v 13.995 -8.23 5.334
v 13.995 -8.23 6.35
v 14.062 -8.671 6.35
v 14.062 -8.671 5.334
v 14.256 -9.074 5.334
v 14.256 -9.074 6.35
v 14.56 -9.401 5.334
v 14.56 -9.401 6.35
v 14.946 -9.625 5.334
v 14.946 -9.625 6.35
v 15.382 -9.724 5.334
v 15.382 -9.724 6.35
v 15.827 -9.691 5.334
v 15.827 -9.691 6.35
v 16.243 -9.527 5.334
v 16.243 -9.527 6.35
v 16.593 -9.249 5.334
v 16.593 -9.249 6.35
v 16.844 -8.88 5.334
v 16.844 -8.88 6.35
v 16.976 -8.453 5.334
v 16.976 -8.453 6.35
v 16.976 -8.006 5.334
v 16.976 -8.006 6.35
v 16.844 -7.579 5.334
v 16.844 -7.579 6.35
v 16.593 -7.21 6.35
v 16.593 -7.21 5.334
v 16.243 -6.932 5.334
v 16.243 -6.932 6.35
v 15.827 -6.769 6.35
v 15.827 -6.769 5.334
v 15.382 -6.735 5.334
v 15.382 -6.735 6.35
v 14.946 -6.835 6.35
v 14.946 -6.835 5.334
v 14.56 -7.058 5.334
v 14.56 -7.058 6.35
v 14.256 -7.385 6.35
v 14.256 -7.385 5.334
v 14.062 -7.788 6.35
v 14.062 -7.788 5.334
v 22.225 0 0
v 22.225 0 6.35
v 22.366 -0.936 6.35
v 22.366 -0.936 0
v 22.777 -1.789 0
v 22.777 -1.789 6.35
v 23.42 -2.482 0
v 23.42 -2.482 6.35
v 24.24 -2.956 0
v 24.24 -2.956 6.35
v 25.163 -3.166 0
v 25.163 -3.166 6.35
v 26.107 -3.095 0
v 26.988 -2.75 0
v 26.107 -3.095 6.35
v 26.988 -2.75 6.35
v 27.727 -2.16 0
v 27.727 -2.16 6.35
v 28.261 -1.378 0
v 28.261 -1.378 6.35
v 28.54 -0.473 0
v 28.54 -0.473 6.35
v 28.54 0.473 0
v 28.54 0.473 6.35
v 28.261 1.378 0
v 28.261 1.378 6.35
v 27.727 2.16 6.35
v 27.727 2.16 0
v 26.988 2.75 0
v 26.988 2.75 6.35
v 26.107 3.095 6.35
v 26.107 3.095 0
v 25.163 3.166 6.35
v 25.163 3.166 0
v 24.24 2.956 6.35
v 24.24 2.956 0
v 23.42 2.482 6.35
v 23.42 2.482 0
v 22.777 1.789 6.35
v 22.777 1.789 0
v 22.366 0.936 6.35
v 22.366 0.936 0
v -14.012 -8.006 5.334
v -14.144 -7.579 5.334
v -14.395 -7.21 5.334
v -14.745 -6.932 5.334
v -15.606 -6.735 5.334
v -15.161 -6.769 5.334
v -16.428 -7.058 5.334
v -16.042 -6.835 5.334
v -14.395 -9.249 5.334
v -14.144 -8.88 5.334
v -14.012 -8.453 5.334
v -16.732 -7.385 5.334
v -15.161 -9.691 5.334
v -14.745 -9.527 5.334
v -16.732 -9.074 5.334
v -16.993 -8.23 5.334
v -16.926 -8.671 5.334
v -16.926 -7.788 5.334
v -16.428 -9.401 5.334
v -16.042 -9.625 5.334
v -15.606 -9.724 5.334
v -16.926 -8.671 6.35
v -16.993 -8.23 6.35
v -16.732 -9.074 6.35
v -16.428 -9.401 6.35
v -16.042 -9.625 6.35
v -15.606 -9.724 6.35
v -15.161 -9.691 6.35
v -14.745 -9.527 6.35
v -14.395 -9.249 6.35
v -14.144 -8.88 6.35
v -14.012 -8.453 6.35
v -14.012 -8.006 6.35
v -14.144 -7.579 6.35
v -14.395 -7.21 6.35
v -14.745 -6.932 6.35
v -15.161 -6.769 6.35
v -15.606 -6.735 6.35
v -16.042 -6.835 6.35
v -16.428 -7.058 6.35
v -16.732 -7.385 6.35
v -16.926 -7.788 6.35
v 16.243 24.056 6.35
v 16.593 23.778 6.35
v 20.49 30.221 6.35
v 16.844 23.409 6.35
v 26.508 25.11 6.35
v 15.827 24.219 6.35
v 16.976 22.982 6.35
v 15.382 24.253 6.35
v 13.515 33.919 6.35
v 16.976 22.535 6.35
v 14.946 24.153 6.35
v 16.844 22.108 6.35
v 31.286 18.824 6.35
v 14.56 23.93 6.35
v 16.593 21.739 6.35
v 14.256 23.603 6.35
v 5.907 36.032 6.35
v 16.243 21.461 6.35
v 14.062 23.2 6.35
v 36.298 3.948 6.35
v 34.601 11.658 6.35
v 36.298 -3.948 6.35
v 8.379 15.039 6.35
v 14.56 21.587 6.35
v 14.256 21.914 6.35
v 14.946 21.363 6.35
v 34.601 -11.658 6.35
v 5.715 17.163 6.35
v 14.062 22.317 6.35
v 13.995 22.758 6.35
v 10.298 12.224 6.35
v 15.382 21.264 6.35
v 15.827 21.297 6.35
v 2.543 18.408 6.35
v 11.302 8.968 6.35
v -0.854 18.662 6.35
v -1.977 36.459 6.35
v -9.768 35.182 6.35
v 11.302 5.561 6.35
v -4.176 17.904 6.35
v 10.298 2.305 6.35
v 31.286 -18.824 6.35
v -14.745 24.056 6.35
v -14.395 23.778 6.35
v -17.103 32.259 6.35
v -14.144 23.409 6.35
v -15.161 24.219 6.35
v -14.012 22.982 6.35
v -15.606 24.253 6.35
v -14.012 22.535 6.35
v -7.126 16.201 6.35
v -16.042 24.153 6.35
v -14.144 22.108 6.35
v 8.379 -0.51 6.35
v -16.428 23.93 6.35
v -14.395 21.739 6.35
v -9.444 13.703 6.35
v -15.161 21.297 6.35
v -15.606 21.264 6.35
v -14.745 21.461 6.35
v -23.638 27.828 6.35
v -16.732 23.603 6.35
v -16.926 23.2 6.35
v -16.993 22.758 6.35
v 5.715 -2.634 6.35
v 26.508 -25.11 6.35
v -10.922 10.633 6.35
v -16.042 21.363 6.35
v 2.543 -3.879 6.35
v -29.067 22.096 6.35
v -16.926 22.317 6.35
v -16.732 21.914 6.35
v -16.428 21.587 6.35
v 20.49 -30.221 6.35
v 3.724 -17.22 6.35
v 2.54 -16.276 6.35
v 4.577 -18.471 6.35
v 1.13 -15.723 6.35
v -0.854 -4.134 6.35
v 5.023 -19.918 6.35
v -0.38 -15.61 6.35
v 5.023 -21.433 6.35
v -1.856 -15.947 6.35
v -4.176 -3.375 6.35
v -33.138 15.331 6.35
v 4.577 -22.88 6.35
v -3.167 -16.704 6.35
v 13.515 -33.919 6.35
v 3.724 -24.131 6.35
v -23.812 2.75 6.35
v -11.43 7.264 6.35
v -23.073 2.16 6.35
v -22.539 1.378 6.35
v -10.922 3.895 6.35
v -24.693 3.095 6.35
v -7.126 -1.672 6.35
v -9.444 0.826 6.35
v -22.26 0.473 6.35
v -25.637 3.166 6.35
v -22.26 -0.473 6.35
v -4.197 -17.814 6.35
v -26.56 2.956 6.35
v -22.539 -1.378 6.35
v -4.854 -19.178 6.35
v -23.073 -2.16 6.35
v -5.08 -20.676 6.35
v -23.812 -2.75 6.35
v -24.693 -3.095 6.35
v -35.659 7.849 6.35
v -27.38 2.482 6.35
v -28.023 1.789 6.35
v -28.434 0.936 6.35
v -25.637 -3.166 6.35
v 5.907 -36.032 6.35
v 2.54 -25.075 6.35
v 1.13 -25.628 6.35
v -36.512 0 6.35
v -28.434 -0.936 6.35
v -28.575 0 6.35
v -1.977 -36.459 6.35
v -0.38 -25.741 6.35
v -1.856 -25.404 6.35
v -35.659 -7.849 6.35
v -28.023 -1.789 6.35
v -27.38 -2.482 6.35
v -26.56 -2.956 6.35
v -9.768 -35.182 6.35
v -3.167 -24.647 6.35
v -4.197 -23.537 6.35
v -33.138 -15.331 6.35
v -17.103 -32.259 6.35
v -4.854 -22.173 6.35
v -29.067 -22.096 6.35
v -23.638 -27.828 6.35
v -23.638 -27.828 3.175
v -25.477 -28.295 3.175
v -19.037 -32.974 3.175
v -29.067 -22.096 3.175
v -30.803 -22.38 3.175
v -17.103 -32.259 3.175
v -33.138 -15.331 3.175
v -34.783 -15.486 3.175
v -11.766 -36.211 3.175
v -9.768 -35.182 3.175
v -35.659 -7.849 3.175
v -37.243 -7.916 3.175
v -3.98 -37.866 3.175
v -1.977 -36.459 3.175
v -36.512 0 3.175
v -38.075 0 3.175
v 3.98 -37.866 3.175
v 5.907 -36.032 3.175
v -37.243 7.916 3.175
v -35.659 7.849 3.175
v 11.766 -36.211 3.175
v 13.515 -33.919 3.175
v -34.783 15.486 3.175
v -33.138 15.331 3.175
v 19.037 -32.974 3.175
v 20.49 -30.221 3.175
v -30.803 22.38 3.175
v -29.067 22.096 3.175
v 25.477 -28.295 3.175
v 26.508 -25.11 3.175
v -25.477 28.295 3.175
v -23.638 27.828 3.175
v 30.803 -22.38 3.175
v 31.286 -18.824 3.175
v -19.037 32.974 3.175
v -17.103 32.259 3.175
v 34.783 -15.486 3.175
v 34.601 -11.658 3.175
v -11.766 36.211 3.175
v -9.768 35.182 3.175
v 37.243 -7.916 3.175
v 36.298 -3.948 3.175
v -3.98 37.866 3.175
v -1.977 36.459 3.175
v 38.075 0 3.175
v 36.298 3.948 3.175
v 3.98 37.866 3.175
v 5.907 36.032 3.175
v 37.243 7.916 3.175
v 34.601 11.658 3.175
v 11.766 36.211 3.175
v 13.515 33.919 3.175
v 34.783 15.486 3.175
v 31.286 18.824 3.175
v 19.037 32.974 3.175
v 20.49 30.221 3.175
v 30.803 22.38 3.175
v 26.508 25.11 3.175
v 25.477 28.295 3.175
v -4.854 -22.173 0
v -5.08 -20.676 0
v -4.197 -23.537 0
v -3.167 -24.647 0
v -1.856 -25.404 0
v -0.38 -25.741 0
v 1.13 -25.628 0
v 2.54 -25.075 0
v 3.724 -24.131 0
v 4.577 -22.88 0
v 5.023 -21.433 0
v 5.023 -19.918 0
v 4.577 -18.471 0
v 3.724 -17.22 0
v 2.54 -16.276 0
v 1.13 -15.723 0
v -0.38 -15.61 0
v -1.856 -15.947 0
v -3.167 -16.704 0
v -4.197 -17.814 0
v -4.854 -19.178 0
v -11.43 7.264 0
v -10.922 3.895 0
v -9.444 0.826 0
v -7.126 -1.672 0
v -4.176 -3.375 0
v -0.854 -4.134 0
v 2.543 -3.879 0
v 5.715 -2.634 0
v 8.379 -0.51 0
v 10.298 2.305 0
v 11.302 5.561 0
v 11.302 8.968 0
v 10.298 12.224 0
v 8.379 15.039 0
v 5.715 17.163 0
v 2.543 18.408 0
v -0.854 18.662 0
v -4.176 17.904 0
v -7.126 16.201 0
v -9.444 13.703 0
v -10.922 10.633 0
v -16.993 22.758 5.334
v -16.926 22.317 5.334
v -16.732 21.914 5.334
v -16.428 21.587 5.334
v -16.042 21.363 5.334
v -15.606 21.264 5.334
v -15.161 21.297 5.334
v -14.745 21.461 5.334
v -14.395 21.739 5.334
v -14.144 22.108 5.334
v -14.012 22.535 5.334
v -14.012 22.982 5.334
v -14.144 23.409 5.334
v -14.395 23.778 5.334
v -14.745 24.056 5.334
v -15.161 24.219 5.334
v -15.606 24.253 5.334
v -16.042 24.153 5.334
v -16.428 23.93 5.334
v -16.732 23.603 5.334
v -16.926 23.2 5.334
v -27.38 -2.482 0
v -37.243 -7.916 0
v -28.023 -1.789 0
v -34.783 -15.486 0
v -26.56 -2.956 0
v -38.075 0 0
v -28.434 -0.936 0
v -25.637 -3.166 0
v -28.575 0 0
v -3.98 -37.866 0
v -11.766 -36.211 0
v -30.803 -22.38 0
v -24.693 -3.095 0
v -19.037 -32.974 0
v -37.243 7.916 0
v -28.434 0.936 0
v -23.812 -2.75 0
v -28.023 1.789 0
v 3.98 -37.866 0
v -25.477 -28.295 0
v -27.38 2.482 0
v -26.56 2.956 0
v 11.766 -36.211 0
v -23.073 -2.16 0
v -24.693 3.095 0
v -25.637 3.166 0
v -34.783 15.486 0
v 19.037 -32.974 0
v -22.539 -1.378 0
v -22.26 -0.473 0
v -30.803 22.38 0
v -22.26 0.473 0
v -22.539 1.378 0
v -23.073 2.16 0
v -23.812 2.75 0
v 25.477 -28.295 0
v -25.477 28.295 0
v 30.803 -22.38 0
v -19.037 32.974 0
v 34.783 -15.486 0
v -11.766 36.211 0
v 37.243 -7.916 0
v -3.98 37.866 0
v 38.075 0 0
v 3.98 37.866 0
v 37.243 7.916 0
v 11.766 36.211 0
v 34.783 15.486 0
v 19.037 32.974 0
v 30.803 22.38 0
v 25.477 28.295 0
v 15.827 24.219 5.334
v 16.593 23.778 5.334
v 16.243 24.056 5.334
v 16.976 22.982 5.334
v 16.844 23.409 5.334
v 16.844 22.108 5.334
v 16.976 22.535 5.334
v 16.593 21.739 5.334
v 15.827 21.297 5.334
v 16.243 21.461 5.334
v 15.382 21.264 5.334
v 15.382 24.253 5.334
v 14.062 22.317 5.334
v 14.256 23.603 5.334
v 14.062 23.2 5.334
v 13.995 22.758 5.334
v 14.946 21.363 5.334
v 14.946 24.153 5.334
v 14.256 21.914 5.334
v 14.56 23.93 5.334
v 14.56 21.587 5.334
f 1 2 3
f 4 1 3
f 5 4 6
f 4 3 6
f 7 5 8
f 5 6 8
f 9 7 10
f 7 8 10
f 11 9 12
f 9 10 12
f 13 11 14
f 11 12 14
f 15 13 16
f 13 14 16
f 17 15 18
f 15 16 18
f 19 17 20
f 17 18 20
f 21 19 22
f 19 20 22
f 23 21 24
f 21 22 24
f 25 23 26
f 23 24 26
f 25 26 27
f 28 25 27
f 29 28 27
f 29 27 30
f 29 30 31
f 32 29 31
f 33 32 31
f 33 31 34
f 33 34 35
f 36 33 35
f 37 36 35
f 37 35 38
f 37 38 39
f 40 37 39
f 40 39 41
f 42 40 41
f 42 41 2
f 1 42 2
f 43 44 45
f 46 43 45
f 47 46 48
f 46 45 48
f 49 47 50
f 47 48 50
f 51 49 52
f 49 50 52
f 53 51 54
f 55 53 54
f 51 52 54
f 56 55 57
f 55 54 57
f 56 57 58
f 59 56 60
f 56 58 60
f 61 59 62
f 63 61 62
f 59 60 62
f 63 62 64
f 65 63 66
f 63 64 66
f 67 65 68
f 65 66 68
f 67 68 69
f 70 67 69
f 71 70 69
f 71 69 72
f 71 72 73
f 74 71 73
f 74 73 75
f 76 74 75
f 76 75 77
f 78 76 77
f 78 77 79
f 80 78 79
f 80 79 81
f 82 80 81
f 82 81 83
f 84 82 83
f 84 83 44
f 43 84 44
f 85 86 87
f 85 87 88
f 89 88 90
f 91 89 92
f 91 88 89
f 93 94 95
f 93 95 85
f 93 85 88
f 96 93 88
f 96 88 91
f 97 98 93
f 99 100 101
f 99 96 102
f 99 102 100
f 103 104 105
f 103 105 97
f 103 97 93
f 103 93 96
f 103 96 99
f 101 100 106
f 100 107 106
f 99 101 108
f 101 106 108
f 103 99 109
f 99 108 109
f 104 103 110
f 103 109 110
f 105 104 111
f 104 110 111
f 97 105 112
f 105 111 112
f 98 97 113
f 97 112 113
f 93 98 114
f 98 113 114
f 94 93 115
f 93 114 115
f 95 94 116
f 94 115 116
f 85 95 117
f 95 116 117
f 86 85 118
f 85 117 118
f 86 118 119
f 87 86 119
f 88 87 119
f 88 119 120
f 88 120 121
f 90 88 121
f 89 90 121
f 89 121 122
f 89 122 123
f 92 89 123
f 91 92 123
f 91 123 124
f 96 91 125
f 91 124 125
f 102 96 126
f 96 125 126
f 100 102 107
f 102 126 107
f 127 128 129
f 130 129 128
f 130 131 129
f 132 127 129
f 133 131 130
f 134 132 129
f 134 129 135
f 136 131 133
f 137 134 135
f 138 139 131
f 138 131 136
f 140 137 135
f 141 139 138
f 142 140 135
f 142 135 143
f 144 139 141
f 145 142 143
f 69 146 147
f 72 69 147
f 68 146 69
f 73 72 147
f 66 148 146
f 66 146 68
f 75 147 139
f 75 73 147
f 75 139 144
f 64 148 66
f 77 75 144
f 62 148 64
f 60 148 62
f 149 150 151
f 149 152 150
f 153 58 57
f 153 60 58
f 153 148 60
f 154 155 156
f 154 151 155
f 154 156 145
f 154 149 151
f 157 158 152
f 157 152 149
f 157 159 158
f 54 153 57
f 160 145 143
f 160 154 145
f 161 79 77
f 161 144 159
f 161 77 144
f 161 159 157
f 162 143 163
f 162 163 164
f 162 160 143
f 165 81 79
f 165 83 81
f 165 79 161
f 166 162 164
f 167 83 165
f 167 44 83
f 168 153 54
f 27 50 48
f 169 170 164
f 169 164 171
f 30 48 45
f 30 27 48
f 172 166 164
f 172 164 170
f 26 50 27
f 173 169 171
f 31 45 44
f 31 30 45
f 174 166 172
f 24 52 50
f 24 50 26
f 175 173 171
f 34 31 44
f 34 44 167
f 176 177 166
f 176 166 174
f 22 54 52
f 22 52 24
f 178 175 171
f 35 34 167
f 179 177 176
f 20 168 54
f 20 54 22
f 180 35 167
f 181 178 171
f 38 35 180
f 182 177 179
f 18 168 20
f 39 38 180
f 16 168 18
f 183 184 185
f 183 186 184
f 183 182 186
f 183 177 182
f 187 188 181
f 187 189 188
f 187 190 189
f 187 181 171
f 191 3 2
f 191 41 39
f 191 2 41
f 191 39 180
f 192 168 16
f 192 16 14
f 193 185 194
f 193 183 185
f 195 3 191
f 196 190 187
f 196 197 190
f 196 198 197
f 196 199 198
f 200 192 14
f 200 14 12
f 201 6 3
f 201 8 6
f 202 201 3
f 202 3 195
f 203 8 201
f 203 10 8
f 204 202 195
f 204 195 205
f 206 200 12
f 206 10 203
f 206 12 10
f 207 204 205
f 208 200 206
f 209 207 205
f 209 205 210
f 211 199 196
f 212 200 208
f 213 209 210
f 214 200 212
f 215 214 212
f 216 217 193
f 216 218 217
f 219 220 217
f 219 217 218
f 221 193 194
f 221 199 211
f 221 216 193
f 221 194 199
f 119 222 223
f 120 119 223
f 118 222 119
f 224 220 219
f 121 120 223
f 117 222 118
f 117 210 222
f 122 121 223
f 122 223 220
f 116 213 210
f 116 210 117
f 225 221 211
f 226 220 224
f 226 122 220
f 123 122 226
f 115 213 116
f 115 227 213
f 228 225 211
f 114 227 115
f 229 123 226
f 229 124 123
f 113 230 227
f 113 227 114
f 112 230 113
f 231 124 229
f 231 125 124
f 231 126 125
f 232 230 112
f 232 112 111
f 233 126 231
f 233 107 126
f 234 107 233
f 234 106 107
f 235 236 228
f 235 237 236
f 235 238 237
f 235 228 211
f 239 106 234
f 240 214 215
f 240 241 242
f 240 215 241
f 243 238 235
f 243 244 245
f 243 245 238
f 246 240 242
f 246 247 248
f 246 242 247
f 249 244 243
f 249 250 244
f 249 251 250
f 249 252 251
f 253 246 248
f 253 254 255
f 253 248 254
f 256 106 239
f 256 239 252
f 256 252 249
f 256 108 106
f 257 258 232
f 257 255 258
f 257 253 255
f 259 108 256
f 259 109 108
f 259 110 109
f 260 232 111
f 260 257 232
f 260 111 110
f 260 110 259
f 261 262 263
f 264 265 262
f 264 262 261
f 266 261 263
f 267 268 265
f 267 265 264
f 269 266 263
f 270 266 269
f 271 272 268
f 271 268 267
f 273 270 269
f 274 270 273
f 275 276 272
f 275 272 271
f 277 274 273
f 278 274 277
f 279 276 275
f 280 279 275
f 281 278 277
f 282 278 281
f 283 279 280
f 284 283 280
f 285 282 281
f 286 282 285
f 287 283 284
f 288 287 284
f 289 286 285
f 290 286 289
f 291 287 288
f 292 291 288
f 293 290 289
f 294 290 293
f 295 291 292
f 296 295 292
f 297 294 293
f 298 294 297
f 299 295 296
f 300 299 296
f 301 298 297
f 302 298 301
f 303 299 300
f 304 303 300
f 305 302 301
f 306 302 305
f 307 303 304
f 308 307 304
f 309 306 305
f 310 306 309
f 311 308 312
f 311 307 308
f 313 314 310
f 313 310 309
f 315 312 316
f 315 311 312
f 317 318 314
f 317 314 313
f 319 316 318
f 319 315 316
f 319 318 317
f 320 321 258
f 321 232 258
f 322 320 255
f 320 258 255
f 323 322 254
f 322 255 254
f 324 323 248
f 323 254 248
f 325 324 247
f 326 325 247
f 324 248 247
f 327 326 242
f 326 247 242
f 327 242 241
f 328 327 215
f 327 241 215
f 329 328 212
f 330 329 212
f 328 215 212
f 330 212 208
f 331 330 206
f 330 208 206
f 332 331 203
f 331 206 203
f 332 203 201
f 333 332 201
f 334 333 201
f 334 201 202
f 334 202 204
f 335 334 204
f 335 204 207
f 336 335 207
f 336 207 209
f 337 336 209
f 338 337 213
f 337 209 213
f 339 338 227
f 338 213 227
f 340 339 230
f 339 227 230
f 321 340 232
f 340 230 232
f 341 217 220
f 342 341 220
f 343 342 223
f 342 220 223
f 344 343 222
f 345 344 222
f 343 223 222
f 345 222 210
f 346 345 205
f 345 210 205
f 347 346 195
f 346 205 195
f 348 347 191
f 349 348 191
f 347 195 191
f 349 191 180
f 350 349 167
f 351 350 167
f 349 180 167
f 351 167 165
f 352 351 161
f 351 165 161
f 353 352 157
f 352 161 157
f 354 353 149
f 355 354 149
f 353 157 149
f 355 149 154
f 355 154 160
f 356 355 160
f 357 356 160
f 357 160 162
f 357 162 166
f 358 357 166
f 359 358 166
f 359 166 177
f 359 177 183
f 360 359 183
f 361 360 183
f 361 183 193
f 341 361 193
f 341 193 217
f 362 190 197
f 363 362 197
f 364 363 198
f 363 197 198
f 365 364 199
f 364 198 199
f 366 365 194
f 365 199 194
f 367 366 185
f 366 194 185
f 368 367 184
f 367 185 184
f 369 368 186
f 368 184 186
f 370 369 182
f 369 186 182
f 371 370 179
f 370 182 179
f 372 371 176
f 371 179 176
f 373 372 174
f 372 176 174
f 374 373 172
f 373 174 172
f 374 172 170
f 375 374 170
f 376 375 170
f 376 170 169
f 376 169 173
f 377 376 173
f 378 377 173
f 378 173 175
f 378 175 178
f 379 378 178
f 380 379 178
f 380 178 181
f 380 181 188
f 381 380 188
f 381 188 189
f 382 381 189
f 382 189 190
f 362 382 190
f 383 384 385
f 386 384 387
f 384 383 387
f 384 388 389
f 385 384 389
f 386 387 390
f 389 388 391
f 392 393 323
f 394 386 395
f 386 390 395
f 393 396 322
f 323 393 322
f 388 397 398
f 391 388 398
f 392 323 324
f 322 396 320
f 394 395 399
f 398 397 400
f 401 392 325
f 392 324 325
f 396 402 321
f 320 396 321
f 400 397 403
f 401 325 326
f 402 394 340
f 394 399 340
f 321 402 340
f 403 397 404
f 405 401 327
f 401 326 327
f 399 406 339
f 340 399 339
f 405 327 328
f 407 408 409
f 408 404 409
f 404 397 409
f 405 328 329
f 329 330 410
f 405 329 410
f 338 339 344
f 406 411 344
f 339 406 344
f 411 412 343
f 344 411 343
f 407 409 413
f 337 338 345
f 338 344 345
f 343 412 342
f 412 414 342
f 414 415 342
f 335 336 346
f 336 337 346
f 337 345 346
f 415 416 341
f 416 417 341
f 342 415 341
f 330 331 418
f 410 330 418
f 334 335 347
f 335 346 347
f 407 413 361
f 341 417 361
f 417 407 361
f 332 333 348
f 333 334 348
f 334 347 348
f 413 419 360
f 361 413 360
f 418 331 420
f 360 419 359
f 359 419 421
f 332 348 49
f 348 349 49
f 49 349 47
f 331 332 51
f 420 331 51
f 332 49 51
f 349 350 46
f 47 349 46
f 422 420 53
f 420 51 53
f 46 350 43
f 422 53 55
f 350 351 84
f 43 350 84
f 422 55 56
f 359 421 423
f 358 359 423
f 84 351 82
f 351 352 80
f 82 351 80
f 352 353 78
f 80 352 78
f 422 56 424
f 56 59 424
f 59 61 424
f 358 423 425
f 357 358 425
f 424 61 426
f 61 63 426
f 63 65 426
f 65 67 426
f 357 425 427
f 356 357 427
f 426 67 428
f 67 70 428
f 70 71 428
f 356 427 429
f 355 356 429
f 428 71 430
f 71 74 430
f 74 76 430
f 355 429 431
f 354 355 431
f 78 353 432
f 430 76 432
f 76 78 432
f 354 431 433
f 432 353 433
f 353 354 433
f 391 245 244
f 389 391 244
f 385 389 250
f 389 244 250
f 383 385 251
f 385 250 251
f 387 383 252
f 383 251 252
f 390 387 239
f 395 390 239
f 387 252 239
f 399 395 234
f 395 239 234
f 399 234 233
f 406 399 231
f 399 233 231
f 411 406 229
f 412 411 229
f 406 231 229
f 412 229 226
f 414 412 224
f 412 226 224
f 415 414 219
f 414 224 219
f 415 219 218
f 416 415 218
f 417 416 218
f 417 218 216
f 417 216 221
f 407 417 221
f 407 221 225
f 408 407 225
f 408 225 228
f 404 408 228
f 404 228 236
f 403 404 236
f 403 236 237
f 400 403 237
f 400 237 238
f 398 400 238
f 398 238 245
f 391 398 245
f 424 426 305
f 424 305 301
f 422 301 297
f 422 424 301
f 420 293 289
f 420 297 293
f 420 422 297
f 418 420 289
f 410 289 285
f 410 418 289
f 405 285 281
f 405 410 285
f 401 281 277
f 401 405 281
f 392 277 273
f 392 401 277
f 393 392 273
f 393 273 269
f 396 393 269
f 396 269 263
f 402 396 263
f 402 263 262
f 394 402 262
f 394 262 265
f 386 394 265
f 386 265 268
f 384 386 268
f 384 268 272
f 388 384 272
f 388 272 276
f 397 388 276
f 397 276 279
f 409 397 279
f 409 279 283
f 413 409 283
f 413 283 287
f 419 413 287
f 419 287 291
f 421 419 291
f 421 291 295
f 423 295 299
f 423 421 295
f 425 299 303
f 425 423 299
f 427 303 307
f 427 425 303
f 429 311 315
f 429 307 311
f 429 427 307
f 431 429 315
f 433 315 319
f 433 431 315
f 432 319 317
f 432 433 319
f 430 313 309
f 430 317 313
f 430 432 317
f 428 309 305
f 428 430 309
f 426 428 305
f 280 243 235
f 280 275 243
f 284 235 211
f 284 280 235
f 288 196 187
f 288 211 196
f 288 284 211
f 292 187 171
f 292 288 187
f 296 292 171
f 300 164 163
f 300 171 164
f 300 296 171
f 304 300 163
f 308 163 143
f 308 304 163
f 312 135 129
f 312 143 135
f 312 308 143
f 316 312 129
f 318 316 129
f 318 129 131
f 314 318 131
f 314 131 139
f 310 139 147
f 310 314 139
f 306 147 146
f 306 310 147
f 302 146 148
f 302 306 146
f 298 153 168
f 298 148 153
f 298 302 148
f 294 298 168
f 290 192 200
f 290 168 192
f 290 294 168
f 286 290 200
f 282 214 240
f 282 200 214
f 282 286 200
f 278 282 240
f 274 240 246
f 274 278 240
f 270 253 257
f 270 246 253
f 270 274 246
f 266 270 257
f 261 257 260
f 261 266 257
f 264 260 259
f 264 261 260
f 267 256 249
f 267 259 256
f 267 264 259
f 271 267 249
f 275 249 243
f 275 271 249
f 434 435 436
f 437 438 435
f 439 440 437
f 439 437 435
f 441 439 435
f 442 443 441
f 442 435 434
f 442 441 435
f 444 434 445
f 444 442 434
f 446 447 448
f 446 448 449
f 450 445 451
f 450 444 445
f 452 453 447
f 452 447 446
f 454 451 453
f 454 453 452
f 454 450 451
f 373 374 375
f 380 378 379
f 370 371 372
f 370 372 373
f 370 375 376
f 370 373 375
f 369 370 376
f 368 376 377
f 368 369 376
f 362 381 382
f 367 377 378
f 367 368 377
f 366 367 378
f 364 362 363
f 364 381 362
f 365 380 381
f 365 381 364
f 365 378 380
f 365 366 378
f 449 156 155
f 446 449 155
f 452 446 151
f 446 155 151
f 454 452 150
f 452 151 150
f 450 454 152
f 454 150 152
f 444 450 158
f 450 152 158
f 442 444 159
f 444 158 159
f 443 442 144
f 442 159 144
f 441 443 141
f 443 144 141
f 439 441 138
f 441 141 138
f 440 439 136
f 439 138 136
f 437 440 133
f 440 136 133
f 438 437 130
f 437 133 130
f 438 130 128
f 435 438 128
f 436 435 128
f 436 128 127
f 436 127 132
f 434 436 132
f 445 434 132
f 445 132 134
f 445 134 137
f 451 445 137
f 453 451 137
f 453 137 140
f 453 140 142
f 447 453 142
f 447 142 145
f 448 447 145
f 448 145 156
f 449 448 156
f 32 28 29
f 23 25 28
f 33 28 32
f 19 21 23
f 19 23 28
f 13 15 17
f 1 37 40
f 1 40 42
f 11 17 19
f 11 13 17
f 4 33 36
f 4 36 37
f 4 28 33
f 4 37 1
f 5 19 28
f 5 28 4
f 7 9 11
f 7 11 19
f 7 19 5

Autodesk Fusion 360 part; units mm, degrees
sketch "Sketch1" plane through (0, 0, 0) normal (0, 0, 1) x (1, 0, 0)
  circle A0 centre (0, 0) radius 38.0746
  dimension "d1" = 76.1492
extrude "Extrude1" add sketch "Sketch1" along normal blind 3.175
sketch "Sketch2" plane through (0, 0, 3.175) normal (0, 0, 1) x (-1, 0, 0)
  circle A0 centre (0, 0) radius 38.0746
  circle A1 centre (0, 0) radius 36.5125
  dimension "d4" = 73.025
extrude "Extrude2" add sketch "Sketch2" along normal blind 3.175 contours A1
sketch "Sketch3" plane through (0, 0, 6.35) normal (0, 0, 1) x (-1, 0, 0)
  circle A0 centre (0, 0) radius 36.5125
  circle A1 centre (25.4, 0) radius 3.175
  circle A2 centre (-25.4, 0) radius 3.175
  circle A3 centre (0, -7.2644) radius 11.43
  circle A4 centre (0, 20.6756) radius 5.08
  circle A5 centre (0, 0) radius 38.0746
  dimension "d7" = 6.35
  dimension "d8" = 6.35
  dimension "d9" = 50.8
  dimension "d10" = 25.4
  dimension "d11" = 10.16
  dimension "d12" = 20.6756
  dimension "d13" = 22.86
  dimension "d14" = 27.94
extrude "Extrude3" cut sketch "Sketch3" against normal blind 22.86 contours A1 | A2 | A3 | A4
sketch "Sketch4" plane through (0, 0, 6.35) normal (0, 0, 1) x (-1, 0, 0)
  circle A0 centre (-25.4, 0) radius 3.175
  circle A1 centre (0, 20.6756) radius 5.08
  circle A2 centre (0, -7.2644) radius 11.43
  circle A3 centre (25.4, 0) radius 3.175
  circle A4 centre (0, 0) radius 36.5125
  circle A5 centre (15.494, -22.7584) radius 1.4986
  circle A6 centre (15.494, 8.2296) radius 1.4986
  circle A7 centre (-15.494, 8.2296) radius 1.4986
  circle A8 centre (-15.494, -22.7584) radius 1.4986
  dimension "d17" = 2.9972
  dimension "d18" = 30.988
  dimension "d19" = 15.494
  dimension "d20" = 15.494
  dimension "d21" = 30.988
extrude "Extrude4" cut sketch "Sketch4" against normal blind 1.016 contours A5 | A6 | A7 | A8
